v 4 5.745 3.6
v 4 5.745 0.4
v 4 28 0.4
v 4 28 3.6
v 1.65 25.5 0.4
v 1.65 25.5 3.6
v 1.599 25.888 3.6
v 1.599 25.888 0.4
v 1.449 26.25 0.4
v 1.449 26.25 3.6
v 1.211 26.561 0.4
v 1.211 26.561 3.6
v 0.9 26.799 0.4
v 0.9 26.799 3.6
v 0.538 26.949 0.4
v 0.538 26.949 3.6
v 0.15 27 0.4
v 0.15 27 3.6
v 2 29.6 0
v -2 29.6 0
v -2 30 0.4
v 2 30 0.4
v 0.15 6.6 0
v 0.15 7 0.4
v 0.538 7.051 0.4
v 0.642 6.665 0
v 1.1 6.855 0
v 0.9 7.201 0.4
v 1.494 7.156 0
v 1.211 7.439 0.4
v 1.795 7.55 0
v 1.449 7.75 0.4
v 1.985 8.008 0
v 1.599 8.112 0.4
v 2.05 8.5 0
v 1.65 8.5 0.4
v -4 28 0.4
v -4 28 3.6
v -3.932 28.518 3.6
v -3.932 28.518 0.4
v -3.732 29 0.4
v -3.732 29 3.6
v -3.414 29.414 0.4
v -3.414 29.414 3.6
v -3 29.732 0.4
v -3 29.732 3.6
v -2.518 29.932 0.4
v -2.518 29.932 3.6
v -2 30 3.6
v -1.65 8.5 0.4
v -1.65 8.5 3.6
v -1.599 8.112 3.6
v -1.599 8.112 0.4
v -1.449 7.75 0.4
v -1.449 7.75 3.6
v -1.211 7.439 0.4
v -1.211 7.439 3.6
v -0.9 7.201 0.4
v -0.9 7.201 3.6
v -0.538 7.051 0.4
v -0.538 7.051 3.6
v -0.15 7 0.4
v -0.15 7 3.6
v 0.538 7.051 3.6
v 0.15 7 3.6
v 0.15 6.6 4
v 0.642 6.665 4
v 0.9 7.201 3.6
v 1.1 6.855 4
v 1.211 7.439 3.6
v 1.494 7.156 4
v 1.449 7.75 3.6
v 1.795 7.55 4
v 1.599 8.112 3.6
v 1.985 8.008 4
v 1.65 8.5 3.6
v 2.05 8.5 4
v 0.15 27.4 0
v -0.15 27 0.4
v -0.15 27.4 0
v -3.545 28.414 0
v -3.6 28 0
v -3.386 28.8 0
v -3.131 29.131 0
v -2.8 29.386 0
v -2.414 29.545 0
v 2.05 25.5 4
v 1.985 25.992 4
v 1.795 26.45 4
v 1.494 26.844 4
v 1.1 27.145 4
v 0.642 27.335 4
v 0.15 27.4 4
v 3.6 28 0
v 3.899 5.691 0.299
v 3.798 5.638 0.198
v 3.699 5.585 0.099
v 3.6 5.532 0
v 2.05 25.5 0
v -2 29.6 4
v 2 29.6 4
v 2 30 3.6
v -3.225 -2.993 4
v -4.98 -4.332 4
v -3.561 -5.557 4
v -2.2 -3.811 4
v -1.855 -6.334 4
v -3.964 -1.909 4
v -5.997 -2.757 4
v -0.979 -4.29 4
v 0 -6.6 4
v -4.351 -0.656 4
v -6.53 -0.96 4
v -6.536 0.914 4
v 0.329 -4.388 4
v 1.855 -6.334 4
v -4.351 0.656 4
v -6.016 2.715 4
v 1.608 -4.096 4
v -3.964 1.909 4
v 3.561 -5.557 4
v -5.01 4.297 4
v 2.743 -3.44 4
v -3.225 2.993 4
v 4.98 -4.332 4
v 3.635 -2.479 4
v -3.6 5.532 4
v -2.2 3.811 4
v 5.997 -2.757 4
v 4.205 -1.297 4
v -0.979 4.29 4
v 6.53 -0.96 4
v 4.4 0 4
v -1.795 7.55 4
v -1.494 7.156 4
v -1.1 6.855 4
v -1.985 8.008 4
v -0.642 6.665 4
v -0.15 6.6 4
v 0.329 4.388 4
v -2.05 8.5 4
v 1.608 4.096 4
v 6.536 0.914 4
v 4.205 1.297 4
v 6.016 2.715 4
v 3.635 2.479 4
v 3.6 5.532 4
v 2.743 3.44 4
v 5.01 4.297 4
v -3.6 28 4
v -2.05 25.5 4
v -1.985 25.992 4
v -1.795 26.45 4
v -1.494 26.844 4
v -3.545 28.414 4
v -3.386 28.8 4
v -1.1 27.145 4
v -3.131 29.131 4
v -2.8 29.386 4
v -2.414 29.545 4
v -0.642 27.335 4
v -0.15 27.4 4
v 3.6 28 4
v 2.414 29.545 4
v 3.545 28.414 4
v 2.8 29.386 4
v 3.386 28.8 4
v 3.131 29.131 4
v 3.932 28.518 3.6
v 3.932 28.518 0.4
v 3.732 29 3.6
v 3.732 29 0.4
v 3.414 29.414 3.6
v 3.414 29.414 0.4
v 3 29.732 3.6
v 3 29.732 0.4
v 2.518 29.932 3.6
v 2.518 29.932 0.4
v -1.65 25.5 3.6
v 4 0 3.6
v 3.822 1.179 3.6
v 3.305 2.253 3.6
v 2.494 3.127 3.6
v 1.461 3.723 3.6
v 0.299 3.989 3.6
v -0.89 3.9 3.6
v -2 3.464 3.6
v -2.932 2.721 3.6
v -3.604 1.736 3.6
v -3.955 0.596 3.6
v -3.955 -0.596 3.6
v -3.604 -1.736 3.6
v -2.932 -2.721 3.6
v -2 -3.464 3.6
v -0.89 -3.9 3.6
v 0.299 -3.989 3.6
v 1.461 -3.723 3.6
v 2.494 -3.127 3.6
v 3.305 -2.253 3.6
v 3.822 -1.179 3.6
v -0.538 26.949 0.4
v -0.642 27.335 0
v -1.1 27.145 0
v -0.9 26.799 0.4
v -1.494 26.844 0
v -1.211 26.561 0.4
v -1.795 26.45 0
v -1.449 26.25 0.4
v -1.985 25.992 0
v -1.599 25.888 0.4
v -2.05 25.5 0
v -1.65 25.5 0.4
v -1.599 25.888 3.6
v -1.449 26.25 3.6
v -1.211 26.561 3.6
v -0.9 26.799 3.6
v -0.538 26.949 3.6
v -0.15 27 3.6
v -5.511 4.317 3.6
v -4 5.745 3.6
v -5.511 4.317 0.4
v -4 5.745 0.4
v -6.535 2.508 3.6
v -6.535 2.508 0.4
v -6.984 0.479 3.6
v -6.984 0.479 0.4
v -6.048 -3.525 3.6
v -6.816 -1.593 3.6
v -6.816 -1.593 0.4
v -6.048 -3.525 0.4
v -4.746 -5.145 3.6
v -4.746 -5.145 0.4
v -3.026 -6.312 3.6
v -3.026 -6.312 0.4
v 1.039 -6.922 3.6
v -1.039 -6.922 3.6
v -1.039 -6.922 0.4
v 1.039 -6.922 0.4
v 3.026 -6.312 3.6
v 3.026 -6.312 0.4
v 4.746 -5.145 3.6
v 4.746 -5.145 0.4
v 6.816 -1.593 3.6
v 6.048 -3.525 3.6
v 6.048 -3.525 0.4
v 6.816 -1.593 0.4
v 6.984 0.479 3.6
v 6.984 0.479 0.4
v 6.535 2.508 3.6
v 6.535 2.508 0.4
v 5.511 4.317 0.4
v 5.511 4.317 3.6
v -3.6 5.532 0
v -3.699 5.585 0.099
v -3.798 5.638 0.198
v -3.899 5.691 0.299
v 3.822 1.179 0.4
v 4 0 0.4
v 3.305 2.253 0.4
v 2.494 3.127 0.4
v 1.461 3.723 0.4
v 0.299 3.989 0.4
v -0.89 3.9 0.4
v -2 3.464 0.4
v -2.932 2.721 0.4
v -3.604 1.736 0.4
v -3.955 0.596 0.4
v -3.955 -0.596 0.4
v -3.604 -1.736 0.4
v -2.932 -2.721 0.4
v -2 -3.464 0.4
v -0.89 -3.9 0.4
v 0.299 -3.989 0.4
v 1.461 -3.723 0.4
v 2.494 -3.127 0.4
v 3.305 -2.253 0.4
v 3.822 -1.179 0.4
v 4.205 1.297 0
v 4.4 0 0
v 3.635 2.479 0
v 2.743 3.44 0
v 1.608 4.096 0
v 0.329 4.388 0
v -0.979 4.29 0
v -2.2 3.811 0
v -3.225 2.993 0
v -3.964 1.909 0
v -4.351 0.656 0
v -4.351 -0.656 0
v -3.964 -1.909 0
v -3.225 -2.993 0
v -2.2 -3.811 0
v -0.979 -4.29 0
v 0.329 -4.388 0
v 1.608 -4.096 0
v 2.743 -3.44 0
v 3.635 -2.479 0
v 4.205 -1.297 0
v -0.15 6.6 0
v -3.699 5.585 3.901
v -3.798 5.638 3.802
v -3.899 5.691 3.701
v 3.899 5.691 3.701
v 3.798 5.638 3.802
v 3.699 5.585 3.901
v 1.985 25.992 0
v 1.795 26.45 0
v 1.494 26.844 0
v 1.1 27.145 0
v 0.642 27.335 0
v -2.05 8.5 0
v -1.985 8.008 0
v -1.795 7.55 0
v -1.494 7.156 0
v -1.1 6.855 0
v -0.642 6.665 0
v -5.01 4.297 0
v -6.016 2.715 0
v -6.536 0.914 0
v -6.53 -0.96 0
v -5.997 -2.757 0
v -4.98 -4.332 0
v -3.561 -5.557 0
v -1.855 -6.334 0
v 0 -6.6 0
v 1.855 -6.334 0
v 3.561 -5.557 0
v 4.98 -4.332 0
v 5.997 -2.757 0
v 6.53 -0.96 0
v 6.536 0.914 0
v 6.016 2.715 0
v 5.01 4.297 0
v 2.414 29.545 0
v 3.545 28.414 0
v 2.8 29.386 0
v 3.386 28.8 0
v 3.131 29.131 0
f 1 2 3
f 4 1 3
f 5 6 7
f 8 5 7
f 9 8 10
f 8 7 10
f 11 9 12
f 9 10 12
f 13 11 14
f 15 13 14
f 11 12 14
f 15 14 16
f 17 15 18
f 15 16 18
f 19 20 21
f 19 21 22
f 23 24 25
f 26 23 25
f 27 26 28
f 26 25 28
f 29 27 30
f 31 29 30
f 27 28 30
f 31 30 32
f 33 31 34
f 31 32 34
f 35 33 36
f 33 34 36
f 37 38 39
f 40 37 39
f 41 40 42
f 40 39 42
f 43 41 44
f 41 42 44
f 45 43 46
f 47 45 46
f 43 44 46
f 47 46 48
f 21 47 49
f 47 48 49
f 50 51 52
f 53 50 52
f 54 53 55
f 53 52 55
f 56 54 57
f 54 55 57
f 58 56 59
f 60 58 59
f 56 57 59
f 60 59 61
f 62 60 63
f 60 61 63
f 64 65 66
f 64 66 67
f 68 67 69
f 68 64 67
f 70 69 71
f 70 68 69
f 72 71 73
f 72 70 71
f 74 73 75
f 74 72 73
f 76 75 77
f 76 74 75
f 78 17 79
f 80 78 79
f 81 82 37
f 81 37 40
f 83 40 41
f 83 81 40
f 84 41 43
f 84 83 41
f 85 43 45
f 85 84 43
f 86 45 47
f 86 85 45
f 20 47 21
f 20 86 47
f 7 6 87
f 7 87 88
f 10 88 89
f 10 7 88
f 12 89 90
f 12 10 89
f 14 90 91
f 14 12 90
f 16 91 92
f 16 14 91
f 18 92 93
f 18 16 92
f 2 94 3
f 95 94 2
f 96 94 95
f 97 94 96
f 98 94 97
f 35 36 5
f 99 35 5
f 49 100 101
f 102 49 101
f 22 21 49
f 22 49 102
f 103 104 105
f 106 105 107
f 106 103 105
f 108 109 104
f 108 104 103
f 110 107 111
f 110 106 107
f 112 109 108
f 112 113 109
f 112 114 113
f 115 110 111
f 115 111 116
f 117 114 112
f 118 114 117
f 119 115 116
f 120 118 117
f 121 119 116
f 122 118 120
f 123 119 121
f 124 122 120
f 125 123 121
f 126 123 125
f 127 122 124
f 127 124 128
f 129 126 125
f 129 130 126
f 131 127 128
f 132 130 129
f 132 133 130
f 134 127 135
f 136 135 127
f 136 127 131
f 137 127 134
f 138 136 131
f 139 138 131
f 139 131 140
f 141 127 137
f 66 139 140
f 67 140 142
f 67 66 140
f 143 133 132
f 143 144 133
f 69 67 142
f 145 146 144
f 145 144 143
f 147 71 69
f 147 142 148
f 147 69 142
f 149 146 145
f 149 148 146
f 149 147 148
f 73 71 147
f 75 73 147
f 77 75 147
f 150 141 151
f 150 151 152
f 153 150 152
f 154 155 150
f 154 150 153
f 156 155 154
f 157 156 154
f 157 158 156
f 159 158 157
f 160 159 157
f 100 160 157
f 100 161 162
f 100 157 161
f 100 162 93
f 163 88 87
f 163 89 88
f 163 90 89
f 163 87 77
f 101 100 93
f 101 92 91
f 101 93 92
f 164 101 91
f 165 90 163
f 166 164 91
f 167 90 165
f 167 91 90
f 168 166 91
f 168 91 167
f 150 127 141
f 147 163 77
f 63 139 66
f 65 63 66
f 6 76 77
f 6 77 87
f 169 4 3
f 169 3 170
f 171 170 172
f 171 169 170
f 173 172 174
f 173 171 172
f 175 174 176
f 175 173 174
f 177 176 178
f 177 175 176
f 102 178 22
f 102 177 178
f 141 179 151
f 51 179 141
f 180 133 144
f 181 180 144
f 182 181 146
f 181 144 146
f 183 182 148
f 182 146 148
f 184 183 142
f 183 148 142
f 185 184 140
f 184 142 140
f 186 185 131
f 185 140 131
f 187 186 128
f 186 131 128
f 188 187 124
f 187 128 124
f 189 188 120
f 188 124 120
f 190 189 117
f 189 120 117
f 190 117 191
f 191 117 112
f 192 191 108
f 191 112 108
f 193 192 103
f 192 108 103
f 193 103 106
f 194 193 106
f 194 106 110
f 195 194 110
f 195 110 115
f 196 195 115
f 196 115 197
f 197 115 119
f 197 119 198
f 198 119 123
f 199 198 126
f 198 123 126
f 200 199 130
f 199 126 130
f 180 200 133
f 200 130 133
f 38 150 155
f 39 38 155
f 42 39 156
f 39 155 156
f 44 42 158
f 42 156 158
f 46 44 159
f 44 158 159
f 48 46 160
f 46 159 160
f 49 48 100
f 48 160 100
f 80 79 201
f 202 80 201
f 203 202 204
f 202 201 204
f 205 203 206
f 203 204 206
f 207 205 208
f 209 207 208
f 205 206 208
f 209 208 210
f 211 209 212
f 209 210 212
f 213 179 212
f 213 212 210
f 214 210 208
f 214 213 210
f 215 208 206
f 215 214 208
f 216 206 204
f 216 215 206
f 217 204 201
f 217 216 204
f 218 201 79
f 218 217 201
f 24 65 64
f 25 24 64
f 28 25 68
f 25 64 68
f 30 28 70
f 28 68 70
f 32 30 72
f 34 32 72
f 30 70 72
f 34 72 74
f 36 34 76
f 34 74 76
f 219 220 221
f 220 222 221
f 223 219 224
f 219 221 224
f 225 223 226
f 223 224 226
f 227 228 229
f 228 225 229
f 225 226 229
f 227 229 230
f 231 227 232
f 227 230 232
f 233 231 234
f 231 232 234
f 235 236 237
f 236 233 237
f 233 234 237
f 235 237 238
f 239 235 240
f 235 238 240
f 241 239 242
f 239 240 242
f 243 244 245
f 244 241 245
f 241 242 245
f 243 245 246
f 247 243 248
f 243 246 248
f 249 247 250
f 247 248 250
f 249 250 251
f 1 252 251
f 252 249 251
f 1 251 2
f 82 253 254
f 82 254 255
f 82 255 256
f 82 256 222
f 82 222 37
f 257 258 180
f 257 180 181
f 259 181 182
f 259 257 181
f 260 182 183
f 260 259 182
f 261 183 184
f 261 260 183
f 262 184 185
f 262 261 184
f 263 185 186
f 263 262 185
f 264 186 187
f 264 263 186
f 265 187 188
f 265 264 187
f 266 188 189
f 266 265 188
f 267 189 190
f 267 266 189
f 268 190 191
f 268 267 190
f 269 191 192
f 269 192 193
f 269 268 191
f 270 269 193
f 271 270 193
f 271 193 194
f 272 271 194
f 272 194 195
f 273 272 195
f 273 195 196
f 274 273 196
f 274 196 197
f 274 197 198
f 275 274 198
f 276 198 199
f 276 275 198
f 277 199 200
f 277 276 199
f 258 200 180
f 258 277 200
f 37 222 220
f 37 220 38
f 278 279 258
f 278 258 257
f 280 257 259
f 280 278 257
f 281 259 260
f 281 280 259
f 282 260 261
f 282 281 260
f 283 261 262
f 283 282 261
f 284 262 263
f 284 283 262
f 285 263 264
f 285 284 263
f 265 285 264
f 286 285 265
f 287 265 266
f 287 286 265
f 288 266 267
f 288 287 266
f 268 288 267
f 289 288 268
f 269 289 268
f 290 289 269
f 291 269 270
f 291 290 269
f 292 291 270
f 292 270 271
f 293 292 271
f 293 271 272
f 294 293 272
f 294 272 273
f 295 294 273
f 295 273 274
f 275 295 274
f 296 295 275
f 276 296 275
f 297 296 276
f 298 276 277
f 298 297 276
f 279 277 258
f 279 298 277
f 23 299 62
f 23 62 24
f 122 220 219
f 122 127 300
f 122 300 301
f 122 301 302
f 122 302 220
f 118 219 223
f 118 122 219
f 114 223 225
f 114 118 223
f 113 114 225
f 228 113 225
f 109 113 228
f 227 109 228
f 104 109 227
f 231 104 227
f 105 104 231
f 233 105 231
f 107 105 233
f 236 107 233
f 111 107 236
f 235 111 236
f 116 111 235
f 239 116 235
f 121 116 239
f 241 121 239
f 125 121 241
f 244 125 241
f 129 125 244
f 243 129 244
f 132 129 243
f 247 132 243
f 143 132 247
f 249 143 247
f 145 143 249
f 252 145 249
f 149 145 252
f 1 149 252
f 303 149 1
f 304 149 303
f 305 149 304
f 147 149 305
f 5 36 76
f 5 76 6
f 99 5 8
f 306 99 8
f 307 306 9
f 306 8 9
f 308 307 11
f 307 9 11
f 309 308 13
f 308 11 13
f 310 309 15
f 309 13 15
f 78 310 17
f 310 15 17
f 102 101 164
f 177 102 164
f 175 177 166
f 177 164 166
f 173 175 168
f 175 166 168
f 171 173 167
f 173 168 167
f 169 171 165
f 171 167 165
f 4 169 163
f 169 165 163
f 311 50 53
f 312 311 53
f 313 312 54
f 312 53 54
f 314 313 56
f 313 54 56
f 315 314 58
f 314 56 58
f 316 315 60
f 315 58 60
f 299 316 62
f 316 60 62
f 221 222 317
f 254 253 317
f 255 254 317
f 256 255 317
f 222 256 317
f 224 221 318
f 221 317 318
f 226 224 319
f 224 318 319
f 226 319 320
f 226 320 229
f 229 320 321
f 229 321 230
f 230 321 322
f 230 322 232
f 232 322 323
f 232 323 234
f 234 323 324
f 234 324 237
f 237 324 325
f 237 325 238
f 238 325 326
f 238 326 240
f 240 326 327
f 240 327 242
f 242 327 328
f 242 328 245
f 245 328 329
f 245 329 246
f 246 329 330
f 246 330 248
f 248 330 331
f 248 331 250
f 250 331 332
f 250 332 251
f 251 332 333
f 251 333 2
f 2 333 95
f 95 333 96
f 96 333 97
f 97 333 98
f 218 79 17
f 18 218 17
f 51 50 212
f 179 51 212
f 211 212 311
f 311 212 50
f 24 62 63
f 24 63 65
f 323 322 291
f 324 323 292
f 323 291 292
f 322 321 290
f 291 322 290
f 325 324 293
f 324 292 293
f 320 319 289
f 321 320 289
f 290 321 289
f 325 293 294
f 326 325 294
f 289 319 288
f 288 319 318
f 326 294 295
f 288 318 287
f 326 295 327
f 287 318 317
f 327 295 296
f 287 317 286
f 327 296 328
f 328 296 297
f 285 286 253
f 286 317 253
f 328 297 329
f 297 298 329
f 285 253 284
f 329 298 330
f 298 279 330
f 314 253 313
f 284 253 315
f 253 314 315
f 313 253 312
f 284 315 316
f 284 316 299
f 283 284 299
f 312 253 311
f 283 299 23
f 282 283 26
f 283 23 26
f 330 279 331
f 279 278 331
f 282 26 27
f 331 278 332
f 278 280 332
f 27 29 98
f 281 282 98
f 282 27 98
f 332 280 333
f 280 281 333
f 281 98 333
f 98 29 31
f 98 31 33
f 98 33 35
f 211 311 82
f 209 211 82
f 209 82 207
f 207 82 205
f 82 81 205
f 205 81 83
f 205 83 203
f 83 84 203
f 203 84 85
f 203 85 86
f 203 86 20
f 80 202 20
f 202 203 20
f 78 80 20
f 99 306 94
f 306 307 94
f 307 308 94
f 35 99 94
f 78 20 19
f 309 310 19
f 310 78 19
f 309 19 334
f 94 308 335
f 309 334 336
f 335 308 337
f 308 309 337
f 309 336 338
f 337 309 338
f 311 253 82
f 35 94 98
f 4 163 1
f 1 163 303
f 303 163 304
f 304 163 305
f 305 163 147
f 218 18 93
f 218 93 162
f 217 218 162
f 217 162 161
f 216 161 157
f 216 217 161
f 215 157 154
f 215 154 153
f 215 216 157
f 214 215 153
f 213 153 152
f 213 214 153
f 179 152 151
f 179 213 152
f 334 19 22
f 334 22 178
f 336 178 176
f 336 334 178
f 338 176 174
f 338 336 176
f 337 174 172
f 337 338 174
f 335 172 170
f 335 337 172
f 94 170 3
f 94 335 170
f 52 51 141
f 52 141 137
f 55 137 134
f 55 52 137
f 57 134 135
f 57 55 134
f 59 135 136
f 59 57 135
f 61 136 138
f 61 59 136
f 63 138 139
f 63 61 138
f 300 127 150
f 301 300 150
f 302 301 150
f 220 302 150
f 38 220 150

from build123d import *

# Parameters (mm, degrees)
BOX001001002_W     = 3.3
BOX001001002_H     = 20
BOX001001002_DEPTH = 10
FILLET001_R        = 1.5
BOX001001003_W     = 8
BOX001001003_H     = 25
BOX001001003_DEPTH = 4
FILLET002_R        = 2
CHAMFER002_SIZE    = 0.4
TUBE_R             = 7
TUBE_R_2           = 4
TUBE_DEPTH         = 4
CHAMFER001_SIZE    = 0.4


with BuildPart() as fillet001:
    # Box001001002 → Box001001002 (new body)
    with BuildSketch(Plane(origin=(-1.65, 7, 0), x_dir=(1, 0, 0), z_dir=(0, 0, 1))):
        with Locations((1.65, 10)):
            Rectangle(BOX001001002_W, BOX001001002_H)
    extrude(amount=BOX001001002_DEPTH)

    # Fillet001
    fillet001_edges = [fillet001.edges().sort_by_distance(p)[0] for p in [
        (-1.65, 7, 5),
        (-1.65, 27, 5),
        (1.65, 7, 5),
        (1.65, 27, 5),
    ]]
    fillet(fillet001_edges, radius=FILLET001_R)


with BuildPart() as chamfer002:
    # Box001001003 → Box001001003 (new body)
    with BuildSketch(Plane(origin=(-4, 5, 0), x_dir=(1, 0, 0), z_dir=(0, 0, 1))):
        with Locations((4, 12.5)):
            Rectangle(BOX001001003_W, BOX001001003_H)
    extrude(amount=BOX001001003_DEPTH)

    # Fillet002
    fillet002_edges = [chamfer002.edges().sort_by_distance(p)[0] for p in [
        (-4, 30, 2),
        (4, 30, 2),
    ]]
    fillet(fillet002_edges, radius=FILLET002_R)

    # Cut002008023012009006003002007003: cut Fillet001
    add(fillet001.part, mode=Mode.SUBTRACT)

    # Chamfer002
    chamfer002_edges = [chamfer002.edges().sort_by_distance(p)[0] for p in [
        (-4, 16.5, 4),
        (-4, 16.5, 0),
        (-3.414214, 29.414214, 4),
        (0, 5, 4),
        (0, 30, 4),
        (4, 16.5, 4),
        (3.414214, 29.414214, 4),
        (-1.21066, 7.43934, 4),
        (0, 7, 4),
        (1.21066, 7.43934, 4),
        (1.65, 17, 4),
        (1.21066, 26.56066, 4),
        (0, 27, 4),
        (-1.21066, 26.56066, 4),
        (-1.65, 17, 4),
        (0, 5, 0),
        (-3.414214, 29.414214, 0),
        (0, 30, 0),
        (4, 16.5, 0),
        (3.414214, 29.414214, 0),
        (-1.21066, 7.43934, 0),
        (0, 7, 0),
        (1.21066, 7.43934, 0),
        (1.65, 17, 0),
        (1.21066, 26.56066, 0),
        (0, 27, 0),
        (-1.21066, 26.56066, 0),
        (-1.65, 17, 0),
    ]]
    chamfer(chamfer002_edges, length=CHAMFER002_SIZE)


with BuildPart() as ptfe_tube_guide_arm_straight:
    # Tube → Tube (new body)
    with BuildSketch(Plane.XY):
        Circle(TUBE_R)
        Circle(TUBE_R_2, mode=Mode.SUBTRACT)
    extrude(amount=TUBE_DEPTH)

    # Chamfer001
    chamfer001_edges = [ptfe_tube_guide_arm_straight.edges().sort_by_distance(p)[0] for p in [
        (-7, 0, 4),
        (-7, 0, 0),
        (-4, 0, 4),
        (-4, 0, 0),
    ]]
    chamfer(chamfer001_edges, length=CHAMFER001_SIZE)

    # Fusion001: union Chamfer002
    add(chamfer002.part)


solid = ptfe_tube_guide_arm_straight.part
